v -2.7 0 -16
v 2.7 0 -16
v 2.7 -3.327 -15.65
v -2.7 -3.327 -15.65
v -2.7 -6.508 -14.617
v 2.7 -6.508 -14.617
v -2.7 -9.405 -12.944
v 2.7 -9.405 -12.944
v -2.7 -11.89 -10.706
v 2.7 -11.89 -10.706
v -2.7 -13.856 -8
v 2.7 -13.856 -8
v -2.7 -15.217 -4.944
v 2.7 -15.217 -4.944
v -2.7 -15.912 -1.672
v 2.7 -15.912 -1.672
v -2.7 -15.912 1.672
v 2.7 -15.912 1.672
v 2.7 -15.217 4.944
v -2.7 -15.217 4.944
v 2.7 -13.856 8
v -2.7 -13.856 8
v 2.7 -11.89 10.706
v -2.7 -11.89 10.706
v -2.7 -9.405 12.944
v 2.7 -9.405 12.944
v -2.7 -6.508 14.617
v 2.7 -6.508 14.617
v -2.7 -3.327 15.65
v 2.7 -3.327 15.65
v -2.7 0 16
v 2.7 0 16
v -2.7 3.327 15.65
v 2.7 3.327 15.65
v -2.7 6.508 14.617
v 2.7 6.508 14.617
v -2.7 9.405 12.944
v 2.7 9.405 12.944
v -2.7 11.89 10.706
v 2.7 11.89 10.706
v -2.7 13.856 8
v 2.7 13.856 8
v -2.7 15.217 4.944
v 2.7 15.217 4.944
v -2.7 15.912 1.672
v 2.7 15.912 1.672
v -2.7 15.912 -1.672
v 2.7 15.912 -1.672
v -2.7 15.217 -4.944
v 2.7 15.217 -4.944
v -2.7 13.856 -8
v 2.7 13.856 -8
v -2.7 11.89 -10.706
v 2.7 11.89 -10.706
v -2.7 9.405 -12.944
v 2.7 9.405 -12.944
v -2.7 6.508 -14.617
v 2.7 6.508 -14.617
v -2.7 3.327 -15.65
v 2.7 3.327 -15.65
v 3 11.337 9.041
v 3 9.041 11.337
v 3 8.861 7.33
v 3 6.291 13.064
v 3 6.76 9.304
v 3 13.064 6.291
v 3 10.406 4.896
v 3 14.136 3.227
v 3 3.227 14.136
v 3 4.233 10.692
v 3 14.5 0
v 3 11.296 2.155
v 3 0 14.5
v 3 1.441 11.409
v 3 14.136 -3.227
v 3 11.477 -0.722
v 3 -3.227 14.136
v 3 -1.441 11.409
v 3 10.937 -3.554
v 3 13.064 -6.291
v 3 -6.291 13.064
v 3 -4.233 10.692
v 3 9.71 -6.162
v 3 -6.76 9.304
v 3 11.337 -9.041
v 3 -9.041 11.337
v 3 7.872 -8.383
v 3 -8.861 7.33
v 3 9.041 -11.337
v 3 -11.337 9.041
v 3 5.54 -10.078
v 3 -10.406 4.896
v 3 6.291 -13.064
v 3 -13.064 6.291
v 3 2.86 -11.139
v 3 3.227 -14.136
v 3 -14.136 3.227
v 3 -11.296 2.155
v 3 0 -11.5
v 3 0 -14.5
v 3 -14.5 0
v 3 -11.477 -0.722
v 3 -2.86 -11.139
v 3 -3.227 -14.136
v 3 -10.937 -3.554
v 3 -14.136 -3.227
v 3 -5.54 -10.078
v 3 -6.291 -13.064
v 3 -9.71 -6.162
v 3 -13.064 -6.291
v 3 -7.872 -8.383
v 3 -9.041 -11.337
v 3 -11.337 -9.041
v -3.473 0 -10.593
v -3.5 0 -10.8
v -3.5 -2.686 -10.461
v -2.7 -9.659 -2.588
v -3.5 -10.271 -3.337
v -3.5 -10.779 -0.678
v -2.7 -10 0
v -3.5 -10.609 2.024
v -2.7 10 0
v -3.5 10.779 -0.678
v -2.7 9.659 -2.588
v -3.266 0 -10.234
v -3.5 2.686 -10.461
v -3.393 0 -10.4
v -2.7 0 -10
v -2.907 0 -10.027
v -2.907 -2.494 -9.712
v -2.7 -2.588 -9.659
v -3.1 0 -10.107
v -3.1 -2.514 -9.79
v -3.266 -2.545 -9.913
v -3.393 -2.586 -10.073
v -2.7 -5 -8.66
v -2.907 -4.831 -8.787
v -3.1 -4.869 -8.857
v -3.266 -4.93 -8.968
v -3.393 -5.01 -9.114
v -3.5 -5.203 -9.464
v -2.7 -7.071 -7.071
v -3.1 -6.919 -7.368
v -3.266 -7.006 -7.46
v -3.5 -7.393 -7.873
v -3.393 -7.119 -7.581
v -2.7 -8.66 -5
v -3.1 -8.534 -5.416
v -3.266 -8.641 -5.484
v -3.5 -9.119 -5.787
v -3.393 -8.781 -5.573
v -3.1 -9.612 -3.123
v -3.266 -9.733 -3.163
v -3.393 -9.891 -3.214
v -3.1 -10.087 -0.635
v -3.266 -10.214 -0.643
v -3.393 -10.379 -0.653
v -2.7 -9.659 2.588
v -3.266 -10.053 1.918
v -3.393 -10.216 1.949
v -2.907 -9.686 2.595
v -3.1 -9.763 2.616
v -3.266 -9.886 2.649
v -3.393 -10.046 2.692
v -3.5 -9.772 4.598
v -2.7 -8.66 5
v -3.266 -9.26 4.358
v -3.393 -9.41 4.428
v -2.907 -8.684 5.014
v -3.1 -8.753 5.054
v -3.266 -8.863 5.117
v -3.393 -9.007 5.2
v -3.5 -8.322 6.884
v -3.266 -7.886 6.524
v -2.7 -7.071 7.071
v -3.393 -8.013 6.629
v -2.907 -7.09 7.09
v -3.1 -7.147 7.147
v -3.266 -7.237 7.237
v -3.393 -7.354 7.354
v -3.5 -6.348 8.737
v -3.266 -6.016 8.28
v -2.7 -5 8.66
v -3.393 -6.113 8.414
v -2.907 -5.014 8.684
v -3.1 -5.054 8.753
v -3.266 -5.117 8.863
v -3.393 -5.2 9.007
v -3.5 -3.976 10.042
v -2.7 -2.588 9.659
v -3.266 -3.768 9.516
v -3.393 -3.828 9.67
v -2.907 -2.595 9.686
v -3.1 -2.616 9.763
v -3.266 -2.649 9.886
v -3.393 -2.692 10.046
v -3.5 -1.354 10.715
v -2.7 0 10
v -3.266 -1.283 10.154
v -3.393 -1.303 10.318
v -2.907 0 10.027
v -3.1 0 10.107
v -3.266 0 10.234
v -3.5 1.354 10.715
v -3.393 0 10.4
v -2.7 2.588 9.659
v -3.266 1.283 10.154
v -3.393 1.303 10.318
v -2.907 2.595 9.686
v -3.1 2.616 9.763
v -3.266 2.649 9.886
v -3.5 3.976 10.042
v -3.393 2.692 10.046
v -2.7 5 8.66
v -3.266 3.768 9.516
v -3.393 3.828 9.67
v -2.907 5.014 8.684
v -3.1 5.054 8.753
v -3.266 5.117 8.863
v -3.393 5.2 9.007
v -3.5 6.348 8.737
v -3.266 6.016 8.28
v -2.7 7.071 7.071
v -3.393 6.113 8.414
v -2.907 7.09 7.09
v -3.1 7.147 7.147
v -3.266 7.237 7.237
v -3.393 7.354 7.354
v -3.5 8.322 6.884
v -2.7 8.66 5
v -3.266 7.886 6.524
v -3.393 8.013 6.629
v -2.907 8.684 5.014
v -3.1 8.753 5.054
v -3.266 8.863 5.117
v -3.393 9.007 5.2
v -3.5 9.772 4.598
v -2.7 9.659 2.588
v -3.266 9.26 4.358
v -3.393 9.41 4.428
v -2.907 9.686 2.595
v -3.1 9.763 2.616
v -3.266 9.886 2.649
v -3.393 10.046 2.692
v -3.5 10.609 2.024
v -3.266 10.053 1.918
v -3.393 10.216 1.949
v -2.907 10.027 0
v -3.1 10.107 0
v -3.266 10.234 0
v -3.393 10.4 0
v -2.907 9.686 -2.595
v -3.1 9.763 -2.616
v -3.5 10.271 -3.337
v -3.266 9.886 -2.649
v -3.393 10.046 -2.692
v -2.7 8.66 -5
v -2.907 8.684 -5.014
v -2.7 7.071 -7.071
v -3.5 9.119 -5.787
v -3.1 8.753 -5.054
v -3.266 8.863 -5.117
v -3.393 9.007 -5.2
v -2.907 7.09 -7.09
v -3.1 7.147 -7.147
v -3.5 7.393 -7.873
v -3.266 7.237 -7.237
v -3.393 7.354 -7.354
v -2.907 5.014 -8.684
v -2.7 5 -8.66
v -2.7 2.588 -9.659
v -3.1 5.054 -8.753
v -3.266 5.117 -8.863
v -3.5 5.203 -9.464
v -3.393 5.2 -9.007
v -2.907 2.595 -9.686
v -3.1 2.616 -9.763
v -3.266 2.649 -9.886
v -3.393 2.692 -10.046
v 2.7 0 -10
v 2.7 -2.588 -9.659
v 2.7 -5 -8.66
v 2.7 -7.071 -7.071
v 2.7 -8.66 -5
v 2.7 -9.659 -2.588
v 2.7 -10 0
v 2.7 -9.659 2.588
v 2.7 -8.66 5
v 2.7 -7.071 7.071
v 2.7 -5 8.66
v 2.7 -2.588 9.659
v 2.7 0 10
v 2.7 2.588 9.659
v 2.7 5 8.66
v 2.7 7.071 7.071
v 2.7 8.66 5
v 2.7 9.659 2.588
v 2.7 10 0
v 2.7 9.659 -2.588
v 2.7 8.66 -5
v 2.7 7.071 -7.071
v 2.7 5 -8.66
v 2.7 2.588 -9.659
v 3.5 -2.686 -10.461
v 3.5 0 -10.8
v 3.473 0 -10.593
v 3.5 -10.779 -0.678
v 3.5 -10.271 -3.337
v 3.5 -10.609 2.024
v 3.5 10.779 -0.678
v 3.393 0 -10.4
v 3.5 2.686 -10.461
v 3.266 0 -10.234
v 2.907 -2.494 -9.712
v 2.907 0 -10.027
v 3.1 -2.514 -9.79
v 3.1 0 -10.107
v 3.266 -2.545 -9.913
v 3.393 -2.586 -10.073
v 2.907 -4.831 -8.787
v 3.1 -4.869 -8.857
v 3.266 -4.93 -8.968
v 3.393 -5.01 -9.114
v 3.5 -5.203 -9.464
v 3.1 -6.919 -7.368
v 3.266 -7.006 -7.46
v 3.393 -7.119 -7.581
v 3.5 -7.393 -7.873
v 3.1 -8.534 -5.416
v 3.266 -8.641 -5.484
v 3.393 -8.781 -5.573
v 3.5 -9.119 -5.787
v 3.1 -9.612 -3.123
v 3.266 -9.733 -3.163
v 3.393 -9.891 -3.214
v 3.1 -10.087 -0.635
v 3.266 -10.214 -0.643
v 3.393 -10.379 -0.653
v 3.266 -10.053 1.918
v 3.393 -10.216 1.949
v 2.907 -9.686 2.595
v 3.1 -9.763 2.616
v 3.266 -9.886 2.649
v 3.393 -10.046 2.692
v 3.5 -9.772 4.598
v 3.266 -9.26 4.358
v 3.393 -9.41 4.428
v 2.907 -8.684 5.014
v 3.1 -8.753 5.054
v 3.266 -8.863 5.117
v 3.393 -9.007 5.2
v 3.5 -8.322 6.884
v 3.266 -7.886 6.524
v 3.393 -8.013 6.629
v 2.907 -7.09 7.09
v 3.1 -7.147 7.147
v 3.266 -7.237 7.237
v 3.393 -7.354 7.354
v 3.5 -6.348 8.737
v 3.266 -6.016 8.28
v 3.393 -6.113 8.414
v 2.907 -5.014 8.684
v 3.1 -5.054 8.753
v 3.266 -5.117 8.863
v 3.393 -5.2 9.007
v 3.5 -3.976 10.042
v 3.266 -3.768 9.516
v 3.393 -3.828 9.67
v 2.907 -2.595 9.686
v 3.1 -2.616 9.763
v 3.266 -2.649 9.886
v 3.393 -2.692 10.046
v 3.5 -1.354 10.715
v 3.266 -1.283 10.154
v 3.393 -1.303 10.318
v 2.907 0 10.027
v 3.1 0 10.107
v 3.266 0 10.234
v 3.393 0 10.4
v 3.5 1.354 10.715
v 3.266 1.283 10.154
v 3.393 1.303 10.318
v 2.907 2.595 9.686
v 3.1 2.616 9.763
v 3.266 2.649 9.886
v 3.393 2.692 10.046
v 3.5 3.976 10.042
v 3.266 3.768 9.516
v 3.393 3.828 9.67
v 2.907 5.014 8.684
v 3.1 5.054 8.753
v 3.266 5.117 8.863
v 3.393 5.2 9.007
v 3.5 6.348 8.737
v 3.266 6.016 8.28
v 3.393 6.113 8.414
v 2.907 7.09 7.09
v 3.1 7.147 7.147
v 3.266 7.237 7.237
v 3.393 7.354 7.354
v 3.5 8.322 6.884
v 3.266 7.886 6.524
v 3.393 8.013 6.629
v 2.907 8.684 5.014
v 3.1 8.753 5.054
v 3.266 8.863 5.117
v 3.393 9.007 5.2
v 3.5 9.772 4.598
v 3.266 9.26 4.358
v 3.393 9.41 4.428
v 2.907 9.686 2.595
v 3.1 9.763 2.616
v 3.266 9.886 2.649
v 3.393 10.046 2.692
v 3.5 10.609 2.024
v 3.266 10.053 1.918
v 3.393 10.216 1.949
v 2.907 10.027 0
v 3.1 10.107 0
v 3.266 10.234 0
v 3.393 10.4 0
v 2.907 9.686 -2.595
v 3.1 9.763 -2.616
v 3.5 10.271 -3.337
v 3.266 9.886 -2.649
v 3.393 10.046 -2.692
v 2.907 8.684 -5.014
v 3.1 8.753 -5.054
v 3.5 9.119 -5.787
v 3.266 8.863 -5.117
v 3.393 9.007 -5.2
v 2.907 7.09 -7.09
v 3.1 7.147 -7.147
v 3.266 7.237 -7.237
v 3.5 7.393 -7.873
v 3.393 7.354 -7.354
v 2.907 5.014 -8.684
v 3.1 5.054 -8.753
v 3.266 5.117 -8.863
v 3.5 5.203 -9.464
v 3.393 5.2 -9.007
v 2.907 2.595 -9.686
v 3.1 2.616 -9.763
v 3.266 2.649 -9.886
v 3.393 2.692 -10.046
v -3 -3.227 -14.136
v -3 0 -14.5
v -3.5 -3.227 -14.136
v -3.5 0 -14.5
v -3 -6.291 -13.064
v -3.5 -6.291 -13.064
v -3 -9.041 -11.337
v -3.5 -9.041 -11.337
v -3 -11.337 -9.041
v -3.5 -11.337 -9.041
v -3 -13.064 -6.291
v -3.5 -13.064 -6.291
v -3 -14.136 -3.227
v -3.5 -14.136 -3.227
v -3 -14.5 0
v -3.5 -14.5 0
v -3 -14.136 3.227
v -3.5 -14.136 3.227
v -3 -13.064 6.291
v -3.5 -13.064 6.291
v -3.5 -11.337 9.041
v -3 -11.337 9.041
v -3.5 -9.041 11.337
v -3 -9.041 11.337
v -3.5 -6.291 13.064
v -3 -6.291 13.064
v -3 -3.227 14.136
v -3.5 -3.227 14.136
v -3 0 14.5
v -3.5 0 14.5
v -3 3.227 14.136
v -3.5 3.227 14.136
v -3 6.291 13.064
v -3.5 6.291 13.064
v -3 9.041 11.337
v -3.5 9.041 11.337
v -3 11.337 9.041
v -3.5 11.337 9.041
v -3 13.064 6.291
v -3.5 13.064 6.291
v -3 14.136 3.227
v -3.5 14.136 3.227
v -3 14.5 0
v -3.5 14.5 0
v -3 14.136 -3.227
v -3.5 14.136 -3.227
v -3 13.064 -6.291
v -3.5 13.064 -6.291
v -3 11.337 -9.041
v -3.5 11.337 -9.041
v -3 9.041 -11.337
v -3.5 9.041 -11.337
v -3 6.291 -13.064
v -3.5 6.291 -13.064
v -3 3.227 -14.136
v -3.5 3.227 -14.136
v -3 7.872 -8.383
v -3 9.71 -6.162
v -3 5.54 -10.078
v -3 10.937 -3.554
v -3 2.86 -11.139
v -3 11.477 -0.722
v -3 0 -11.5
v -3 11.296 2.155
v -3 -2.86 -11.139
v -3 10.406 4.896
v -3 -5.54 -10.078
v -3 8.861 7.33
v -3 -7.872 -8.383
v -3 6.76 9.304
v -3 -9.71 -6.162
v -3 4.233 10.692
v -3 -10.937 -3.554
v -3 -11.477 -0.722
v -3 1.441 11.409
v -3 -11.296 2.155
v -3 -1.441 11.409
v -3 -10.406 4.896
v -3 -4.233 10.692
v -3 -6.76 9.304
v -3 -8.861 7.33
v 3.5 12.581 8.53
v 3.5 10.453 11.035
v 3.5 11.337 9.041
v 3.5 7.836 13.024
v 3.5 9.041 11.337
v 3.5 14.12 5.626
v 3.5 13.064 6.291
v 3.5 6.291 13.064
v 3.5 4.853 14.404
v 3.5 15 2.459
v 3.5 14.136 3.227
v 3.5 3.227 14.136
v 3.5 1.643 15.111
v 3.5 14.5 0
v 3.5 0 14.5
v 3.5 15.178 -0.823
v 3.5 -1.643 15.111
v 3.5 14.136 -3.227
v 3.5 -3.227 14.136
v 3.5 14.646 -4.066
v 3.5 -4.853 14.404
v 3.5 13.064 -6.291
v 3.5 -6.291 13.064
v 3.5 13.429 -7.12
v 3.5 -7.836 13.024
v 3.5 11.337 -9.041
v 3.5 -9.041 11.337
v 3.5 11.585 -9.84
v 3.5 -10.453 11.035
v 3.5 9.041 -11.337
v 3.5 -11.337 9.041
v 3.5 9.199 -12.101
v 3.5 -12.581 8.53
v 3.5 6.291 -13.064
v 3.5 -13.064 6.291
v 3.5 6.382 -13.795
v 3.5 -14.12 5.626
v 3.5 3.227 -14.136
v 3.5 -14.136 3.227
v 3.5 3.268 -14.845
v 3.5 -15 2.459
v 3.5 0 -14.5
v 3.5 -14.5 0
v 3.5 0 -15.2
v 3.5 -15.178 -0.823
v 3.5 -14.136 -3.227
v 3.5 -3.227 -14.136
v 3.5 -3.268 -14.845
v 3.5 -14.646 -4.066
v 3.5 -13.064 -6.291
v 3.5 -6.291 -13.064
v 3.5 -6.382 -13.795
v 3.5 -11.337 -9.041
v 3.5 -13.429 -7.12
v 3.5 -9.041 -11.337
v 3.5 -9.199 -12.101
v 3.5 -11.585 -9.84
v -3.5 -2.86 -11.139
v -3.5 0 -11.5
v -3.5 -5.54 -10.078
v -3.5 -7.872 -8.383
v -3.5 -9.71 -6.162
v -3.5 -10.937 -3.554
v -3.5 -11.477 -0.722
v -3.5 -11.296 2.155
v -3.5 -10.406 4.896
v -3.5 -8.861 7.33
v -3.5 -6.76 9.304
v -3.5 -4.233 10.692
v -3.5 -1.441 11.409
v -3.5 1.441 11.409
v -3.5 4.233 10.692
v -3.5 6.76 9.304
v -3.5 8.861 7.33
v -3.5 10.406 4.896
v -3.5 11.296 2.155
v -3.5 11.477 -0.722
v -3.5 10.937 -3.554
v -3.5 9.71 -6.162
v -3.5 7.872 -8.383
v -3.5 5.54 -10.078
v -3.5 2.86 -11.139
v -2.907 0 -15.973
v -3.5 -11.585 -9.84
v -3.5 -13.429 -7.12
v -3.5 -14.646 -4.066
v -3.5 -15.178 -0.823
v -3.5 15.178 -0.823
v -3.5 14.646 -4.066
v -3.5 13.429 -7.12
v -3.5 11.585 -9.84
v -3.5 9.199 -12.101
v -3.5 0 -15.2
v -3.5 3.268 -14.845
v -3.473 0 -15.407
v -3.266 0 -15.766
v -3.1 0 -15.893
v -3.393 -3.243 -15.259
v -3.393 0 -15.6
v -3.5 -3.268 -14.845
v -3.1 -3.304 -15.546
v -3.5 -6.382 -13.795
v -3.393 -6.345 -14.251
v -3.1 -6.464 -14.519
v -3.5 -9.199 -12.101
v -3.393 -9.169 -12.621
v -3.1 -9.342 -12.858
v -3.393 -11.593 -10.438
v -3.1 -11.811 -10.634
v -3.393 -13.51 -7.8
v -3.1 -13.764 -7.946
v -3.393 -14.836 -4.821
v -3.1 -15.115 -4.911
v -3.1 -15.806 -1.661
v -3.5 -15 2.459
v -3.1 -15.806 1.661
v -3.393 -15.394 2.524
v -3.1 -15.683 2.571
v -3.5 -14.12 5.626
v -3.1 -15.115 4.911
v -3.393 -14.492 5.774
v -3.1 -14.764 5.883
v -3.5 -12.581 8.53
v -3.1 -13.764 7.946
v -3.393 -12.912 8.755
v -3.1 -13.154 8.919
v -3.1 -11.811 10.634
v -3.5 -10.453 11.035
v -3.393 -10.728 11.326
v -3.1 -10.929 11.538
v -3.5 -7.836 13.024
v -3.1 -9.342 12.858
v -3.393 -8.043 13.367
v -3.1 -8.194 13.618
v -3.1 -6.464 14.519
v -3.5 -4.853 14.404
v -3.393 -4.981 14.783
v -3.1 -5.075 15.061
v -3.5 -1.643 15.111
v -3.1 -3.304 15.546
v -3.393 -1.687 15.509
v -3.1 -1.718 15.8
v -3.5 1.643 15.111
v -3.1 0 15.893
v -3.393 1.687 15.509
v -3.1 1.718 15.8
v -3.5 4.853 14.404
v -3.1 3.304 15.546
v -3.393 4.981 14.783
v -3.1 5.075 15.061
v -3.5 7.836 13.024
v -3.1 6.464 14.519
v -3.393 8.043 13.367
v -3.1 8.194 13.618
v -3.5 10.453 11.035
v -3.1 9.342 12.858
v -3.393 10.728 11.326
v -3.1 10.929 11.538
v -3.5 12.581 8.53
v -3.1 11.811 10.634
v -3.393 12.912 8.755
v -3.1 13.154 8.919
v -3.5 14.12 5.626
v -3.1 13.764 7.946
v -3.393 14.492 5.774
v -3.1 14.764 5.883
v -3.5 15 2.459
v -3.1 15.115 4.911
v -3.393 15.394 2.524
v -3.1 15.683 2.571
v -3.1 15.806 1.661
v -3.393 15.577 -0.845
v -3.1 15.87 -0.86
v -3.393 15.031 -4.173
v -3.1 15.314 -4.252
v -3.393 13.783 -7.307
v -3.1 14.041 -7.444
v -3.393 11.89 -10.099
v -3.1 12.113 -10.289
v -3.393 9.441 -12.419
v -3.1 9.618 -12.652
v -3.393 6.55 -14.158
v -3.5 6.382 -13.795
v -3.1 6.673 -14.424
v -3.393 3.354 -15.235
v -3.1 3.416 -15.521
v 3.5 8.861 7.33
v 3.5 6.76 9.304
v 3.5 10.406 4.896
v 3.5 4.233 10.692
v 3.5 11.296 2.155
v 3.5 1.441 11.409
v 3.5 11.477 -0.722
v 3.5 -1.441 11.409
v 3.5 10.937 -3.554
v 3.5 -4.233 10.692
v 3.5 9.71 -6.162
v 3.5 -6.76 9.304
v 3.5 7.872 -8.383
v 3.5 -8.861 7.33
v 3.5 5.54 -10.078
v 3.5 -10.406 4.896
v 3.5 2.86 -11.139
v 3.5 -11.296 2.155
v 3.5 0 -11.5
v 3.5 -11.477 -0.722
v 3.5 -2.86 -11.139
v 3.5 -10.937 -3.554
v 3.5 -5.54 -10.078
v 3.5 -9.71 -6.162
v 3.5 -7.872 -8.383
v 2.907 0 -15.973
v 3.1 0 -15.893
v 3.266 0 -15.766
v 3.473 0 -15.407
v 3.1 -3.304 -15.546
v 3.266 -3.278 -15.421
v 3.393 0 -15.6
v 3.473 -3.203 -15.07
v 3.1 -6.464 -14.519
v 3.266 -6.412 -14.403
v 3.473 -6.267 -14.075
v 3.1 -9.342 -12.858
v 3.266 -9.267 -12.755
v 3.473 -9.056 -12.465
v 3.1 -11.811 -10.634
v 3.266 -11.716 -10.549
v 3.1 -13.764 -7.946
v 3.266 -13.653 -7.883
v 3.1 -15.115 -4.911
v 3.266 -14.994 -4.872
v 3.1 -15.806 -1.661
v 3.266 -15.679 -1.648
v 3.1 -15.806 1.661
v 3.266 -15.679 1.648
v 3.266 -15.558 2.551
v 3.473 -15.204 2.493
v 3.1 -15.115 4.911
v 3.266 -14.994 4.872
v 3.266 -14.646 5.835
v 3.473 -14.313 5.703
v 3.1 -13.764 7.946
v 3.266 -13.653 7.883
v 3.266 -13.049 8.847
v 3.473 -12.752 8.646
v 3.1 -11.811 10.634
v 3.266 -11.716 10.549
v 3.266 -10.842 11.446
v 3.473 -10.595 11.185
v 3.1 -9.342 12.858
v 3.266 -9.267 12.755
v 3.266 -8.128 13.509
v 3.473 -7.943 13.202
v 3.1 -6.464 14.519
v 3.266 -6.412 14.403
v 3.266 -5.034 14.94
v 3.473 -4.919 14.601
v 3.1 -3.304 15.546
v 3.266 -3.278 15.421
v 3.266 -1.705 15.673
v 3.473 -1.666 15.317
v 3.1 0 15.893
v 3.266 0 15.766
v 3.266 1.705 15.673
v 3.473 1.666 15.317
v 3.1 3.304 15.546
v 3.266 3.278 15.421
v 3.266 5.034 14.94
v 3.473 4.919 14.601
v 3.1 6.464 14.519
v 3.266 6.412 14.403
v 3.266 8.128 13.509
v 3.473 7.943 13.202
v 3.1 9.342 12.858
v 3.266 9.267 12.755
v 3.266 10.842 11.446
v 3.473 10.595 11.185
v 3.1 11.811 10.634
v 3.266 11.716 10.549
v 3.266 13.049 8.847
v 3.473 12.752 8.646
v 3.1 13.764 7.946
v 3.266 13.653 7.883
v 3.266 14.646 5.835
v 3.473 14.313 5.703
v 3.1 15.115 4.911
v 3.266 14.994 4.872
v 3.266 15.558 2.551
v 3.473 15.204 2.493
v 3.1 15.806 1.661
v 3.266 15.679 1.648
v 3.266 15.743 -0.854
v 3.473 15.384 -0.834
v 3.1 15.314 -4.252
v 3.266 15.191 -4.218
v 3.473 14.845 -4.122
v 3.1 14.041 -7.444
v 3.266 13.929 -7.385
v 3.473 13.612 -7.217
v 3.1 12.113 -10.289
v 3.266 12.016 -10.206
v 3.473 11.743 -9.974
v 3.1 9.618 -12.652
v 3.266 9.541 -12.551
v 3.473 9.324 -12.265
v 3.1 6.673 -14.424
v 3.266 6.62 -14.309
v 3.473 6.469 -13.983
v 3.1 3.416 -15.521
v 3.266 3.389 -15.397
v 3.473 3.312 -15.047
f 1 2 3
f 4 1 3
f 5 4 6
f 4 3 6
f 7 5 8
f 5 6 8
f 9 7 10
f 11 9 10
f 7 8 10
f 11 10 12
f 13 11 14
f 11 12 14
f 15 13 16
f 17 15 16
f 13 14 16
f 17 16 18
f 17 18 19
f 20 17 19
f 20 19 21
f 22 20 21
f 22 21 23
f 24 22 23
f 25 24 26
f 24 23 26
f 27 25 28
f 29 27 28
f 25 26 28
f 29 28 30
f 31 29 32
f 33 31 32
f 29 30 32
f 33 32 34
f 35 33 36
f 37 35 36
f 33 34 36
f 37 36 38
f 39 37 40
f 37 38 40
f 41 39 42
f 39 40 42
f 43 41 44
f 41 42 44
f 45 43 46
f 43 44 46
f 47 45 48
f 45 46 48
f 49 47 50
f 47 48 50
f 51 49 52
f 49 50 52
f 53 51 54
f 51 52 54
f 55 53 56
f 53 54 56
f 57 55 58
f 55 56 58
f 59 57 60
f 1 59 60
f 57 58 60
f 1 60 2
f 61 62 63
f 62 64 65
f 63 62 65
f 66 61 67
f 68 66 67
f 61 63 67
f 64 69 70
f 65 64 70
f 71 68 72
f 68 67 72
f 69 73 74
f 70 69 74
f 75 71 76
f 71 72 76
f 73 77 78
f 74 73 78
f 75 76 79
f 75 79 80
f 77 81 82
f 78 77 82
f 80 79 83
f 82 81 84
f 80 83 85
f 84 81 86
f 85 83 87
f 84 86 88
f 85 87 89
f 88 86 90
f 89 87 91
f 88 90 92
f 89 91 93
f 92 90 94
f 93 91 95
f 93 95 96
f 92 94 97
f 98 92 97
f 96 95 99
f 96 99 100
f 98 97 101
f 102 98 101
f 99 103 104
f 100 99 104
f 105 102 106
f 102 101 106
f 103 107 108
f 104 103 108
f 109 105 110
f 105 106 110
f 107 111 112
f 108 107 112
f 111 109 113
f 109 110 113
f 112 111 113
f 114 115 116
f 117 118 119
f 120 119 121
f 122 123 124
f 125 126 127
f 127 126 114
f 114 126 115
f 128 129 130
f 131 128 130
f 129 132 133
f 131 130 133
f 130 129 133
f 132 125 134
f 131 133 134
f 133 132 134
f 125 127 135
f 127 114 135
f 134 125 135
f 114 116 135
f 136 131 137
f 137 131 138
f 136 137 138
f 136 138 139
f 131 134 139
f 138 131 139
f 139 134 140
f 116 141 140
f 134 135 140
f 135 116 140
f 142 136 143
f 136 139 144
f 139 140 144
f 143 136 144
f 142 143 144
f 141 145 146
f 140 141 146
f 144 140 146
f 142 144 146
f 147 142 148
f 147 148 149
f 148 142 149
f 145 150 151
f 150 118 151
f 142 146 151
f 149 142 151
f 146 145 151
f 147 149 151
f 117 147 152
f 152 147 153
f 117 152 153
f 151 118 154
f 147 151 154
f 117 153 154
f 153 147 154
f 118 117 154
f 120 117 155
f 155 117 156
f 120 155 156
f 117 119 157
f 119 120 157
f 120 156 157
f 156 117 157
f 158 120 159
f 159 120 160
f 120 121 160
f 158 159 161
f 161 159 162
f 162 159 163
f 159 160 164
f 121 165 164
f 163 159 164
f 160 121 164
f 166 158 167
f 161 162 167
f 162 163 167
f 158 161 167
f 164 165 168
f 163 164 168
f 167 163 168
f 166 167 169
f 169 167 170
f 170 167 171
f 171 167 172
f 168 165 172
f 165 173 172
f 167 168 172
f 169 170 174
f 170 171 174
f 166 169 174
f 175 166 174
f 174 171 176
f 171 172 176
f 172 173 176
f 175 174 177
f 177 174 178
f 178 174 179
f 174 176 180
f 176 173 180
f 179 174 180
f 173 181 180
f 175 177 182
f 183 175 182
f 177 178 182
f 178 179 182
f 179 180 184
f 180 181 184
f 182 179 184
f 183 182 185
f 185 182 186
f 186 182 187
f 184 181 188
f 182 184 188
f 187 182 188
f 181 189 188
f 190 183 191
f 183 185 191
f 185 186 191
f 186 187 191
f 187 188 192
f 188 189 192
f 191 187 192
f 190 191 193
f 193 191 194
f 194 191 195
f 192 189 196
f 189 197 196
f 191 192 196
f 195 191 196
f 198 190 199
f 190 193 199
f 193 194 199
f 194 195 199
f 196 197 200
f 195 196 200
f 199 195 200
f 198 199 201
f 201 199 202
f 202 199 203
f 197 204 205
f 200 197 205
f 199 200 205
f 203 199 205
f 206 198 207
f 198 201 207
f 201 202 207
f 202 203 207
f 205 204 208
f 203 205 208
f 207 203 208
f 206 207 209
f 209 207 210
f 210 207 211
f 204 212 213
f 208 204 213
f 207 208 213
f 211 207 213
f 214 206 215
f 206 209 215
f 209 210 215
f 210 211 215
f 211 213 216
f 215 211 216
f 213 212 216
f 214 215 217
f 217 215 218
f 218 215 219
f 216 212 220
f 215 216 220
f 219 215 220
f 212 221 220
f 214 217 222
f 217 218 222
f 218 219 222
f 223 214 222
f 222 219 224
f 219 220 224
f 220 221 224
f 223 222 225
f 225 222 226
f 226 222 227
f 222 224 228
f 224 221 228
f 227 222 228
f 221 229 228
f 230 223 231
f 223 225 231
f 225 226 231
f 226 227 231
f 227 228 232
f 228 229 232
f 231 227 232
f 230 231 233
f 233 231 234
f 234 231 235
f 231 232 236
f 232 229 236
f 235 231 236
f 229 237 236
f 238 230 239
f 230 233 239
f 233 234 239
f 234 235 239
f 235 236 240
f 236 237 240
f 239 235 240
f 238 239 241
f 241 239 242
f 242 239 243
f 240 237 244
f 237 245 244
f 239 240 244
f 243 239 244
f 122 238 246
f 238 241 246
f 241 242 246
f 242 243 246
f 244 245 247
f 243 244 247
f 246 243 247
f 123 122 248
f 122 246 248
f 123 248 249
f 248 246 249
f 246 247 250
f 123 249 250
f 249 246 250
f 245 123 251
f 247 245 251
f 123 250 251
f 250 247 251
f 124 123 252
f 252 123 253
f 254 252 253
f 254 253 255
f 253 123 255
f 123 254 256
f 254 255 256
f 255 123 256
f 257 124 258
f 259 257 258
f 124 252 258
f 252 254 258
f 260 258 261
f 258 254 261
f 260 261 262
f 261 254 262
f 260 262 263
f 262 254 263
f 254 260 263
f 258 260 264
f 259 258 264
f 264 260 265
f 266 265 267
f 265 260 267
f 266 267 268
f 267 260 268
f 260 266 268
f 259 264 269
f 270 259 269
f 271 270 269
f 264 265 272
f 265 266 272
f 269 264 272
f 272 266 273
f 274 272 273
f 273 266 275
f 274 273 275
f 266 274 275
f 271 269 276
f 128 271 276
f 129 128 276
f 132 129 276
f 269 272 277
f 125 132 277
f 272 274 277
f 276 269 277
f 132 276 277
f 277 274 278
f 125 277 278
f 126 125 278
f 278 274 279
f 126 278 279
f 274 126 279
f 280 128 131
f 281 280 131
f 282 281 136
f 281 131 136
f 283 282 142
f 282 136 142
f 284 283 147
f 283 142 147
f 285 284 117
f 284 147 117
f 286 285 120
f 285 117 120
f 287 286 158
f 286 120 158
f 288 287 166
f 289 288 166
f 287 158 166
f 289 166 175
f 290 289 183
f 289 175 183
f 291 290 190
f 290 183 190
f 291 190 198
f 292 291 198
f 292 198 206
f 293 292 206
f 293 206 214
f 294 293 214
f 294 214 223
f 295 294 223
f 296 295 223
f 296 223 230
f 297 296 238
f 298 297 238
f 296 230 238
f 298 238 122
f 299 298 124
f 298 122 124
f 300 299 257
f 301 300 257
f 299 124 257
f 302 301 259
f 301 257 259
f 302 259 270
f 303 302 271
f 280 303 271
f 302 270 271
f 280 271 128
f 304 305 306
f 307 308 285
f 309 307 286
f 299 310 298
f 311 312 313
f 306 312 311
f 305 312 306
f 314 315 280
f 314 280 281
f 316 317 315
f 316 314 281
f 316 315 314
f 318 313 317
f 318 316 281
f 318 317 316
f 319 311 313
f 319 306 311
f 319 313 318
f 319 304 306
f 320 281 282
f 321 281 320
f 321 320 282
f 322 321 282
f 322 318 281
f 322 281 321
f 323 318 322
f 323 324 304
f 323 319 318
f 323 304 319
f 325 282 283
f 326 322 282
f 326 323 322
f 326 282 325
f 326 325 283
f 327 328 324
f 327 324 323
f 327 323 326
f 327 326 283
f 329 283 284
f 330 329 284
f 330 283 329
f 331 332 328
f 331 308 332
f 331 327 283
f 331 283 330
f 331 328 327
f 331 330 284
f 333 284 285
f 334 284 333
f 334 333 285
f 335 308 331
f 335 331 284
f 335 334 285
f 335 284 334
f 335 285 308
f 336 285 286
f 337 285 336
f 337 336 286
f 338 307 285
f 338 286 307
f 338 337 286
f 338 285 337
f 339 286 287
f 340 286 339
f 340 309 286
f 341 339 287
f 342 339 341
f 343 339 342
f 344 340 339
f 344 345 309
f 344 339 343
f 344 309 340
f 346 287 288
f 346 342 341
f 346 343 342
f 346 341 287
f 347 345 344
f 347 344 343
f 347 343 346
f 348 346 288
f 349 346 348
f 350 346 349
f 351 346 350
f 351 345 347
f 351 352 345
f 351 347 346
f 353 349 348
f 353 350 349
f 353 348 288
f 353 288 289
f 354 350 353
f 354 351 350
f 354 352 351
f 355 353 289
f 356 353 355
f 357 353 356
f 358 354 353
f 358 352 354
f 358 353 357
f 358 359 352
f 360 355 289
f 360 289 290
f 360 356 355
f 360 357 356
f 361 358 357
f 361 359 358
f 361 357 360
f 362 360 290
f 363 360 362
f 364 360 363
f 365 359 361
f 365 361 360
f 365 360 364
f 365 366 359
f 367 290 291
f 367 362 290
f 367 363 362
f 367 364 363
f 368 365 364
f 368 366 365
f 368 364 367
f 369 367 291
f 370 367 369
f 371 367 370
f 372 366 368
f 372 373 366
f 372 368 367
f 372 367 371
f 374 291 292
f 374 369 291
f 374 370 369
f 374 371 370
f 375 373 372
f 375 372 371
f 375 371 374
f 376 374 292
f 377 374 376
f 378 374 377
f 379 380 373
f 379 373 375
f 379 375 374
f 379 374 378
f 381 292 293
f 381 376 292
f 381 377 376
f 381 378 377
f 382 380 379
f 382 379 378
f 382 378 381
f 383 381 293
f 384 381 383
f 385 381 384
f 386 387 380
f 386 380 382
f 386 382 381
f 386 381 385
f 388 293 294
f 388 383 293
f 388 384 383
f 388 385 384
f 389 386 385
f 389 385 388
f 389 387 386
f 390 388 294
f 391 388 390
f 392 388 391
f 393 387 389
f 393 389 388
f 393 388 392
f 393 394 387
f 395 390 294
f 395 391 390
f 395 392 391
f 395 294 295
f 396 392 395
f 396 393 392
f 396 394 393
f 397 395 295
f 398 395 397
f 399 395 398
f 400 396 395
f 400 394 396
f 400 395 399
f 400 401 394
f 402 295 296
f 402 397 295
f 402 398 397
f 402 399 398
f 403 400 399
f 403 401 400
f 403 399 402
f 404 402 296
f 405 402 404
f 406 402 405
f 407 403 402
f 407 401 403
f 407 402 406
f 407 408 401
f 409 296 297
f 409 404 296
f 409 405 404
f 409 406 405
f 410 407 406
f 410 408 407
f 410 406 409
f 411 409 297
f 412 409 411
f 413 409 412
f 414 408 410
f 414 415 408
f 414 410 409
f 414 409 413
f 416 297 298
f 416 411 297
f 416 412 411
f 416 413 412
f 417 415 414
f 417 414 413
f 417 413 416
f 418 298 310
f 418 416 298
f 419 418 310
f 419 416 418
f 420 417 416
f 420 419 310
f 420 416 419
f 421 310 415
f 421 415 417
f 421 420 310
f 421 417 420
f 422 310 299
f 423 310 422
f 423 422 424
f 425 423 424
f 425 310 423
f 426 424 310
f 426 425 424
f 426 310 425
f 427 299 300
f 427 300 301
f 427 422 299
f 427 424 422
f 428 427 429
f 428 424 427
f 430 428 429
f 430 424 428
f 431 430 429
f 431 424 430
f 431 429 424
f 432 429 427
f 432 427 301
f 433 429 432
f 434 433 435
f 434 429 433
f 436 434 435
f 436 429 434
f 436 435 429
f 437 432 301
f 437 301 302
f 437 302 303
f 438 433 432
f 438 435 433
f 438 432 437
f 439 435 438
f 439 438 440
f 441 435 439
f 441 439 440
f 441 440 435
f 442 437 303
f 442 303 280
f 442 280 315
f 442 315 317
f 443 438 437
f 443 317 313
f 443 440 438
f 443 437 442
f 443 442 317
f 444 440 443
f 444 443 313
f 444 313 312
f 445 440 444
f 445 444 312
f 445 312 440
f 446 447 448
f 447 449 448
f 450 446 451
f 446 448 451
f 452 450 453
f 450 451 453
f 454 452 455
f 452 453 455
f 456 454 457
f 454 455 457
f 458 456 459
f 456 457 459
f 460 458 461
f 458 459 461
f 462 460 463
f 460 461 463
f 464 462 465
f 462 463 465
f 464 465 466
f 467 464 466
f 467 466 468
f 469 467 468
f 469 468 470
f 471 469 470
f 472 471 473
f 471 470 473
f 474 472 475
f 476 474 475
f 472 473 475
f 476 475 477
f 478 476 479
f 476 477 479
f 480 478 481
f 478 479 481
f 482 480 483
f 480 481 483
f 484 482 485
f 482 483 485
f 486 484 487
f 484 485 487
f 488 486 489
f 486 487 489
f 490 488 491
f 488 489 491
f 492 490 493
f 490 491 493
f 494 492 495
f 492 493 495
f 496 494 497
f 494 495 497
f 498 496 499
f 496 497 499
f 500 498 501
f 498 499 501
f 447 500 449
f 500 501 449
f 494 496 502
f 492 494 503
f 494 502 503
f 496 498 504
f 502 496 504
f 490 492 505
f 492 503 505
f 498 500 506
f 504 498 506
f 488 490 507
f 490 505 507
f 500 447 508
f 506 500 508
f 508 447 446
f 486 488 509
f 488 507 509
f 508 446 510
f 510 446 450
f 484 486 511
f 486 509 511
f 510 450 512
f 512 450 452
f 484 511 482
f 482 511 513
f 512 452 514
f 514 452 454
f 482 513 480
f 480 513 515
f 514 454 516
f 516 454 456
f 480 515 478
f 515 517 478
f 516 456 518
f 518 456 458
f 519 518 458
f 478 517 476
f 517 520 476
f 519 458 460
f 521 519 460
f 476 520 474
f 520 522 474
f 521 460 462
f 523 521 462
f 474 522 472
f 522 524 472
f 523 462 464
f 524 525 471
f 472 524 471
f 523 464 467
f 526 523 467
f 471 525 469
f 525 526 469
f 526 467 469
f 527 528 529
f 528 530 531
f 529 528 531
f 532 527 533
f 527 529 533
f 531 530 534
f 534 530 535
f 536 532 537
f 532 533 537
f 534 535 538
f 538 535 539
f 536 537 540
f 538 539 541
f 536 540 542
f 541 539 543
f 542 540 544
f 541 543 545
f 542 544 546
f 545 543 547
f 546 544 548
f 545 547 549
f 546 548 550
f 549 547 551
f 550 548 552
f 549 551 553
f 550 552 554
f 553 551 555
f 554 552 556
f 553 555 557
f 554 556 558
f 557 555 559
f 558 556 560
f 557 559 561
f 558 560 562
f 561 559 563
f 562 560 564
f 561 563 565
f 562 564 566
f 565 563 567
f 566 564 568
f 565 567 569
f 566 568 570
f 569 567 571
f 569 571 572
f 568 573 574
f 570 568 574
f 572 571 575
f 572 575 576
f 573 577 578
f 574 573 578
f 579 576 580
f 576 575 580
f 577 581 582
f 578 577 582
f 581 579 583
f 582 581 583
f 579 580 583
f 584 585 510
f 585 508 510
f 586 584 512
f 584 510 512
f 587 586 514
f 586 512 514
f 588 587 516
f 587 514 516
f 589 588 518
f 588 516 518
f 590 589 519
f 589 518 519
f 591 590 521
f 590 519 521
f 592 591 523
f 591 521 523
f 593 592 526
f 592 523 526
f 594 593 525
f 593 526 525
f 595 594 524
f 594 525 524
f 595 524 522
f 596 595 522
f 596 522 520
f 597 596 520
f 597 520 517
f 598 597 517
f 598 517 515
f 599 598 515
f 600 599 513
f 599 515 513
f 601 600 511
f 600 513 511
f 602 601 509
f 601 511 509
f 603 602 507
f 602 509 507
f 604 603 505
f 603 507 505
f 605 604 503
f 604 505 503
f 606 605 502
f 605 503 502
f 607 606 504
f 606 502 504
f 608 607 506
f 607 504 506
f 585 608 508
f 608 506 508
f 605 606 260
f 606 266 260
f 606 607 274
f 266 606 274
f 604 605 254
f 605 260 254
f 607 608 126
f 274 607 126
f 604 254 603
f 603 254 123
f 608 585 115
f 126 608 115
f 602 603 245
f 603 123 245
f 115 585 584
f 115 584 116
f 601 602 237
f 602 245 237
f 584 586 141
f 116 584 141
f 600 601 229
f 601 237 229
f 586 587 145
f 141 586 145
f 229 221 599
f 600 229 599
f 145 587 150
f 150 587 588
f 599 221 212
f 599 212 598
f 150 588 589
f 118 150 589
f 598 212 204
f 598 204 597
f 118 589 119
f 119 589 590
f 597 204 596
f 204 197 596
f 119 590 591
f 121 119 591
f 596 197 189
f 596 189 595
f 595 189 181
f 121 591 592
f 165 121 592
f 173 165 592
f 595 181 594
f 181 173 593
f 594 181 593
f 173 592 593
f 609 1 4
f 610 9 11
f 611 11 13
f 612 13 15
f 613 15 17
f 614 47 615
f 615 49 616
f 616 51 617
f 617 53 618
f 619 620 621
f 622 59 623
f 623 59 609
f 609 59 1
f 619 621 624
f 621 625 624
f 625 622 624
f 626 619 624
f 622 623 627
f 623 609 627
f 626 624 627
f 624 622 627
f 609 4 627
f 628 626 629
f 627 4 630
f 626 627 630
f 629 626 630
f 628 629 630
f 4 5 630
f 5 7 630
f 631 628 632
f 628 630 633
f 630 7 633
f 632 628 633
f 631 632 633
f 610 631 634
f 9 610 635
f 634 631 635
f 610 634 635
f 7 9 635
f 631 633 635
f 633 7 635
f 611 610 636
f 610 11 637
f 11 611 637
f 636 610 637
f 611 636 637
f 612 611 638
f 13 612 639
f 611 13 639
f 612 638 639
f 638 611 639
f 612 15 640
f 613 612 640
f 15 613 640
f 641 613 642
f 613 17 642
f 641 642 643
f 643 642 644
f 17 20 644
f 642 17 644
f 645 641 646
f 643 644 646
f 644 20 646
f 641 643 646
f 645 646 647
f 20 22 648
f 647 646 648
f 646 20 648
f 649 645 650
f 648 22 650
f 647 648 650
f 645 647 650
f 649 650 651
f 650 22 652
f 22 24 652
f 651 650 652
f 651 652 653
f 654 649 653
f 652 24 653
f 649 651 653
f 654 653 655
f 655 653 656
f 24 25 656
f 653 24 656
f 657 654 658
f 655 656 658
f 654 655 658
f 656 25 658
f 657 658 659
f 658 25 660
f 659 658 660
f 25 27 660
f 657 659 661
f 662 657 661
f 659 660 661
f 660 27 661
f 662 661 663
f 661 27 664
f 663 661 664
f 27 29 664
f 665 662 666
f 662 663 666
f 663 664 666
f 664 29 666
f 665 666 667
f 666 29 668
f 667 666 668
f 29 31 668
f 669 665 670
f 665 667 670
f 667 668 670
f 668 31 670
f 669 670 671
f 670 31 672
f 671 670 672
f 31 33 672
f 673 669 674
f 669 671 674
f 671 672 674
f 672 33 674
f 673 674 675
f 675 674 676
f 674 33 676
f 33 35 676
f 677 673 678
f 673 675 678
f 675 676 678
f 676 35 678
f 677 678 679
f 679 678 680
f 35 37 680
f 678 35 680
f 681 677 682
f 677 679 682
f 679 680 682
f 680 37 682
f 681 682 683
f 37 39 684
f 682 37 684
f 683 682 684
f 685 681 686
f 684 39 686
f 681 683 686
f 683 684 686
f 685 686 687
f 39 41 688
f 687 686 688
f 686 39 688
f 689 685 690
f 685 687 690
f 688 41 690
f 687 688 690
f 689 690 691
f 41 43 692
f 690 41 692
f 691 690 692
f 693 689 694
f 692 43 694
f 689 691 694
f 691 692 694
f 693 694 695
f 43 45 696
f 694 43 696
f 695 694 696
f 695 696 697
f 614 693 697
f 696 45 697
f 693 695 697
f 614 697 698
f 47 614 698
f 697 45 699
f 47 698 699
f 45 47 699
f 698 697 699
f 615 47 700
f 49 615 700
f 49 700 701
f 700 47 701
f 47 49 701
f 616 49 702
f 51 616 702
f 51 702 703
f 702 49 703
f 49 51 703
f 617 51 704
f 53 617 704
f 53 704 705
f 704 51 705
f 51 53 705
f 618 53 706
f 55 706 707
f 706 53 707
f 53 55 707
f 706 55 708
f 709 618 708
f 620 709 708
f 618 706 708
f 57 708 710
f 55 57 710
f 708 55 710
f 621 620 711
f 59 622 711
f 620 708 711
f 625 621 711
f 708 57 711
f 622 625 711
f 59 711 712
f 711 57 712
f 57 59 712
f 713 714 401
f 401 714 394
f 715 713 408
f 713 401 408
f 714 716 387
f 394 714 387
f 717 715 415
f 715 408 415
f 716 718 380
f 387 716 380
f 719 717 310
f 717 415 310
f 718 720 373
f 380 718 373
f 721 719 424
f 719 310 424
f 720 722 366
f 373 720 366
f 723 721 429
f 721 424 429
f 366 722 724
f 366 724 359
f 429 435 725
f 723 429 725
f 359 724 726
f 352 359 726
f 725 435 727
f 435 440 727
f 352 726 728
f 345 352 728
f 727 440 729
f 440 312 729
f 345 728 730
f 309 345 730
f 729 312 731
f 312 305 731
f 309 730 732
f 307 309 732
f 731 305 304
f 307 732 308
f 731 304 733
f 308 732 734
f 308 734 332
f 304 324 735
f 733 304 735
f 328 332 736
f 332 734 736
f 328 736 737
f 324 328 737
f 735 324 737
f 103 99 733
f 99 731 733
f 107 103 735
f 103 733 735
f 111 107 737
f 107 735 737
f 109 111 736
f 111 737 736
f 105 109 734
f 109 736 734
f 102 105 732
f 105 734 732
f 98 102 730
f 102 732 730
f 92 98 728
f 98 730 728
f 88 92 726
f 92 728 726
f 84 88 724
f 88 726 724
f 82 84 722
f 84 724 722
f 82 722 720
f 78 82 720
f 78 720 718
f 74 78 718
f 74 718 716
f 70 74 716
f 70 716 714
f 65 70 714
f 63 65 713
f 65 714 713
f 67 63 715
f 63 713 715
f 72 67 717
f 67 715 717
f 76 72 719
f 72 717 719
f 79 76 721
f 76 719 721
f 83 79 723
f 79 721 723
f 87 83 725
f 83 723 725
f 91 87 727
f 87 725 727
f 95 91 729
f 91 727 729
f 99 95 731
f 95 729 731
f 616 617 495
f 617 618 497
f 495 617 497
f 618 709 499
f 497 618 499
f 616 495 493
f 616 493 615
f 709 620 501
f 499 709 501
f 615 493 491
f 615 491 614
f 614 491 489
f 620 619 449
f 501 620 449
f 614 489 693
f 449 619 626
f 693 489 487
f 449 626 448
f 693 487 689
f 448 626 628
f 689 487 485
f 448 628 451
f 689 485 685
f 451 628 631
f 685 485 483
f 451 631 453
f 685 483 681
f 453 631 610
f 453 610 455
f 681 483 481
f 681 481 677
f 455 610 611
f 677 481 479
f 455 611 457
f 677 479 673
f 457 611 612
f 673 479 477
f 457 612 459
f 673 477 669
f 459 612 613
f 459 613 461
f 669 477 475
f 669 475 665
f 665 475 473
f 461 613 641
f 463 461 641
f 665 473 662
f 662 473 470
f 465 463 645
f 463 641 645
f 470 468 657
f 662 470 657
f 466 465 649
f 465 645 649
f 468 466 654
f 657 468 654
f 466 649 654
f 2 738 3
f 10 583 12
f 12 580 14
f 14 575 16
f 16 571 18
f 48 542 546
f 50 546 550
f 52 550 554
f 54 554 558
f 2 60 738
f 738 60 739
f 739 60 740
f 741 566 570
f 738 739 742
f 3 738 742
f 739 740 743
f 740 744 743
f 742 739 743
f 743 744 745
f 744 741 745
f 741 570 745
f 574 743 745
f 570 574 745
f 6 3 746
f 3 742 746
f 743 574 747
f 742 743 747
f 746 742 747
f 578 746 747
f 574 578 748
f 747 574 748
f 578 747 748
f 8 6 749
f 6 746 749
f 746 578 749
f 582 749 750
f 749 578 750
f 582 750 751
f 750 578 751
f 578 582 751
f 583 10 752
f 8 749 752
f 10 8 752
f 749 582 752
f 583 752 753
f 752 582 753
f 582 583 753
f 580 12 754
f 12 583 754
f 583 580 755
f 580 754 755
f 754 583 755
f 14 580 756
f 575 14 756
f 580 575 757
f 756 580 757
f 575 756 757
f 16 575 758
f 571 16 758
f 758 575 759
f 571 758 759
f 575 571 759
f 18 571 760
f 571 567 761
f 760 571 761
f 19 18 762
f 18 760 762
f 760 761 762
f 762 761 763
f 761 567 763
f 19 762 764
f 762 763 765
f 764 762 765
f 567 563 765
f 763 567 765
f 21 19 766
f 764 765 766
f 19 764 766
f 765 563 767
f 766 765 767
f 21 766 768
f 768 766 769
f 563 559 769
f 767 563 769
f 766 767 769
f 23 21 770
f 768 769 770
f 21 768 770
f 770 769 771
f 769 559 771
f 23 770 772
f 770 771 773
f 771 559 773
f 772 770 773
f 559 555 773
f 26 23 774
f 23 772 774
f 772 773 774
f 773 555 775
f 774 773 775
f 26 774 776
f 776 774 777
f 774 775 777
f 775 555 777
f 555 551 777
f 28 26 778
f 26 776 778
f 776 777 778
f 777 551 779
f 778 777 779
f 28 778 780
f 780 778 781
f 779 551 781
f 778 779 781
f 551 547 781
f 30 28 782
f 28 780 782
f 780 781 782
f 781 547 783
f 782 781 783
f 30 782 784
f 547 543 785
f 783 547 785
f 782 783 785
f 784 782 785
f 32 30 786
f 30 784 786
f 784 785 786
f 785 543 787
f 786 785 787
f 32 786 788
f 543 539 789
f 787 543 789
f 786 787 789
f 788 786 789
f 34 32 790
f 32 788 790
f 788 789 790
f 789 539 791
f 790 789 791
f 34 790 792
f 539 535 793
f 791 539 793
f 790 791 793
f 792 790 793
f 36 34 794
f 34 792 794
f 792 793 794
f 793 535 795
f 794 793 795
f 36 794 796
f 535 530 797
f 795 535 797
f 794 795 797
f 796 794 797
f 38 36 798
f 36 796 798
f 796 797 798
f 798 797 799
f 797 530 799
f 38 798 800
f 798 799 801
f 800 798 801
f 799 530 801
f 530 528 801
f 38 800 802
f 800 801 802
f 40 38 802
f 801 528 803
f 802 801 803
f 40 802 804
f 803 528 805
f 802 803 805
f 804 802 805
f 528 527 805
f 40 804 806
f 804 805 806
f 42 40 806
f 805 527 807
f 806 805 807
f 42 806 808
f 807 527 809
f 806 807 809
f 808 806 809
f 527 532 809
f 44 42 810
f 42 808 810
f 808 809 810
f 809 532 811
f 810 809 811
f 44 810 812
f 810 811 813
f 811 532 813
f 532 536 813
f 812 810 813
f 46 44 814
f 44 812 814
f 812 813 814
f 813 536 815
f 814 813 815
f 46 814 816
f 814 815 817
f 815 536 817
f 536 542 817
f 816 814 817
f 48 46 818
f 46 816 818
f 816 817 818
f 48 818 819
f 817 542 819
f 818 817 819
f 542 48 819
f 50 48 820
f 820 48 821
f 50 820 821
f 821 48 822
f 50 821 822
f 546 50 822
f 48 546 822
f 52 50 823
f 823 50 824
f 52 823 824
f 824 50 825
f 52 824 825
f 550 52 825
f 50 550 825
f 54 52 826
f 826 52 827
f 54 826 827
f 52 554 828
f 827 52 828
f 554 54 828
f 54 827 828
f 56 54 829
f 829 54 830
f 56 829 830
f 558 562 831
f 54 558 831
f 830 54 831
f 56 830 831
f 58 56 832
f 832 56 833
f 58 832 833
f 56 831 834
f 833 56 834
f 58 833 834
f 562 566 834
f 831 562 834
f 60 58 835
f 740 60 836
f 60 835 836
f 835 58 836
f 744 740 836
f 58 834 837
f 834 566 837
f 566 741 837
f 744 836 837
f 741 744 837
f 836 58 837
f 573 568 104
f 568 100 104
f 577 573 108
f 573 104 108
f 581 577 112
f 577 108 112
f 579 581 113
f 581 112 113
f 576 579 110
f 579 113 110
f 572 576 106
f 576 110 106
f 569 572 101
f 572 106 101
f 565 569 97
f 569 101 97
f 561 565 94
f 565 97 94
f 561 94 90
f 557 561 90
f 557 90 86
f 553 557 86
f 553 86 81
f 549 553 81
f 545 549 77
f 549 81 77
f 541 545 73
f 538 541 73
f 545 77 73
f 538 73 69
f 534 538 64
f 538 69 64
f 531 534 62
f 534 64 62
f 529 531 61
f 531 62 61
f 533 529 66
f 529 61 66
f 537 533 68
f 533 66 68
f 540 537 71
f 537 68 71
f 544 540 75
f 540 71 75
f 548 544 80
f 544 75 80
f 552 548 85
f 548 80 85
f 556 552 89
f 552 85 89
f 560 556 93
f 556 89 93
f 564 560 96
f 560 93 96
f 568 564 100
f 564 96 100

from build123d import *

# Parameters (mm, degrees)
FILLET_1_R = 0.8


with BuildPart() as part:
    # Эскиз1 → Повернуть1 (revolve)
    with BuildSketch(Plane.XY, mode=Mode.PRIVATE) as revolve_1_sk:
        Polygon((3.5, 10), (-3.5, 10), (-3.5, 11.5), (-3, 11.5), (-3, 14.5), (-3.5, 14.5), (-3.5, 16), (3.5, 16), (3.5, 14.5), (3, 14.5), (3, 11.5), (3.5, 11.5), align=None)
    revolve(revolve_1_sk.sketch.rotate(Axis((0, 0, 0), (-1, 0, 0)), 90), axis=Axis((0, 0, 0), (-1, 0, 0)))

    # Скругление1
    fillet_1_edges = [part.edges().sort_by_distance(p)[0] for p in [
        (-3.5, 0, 16),
        (3.5, 0, 16),
        (3.5, 0, 10),
        (-3.5, 0, 10),
    ]]
    fillet(fillet_1_edges, radius=FILLET_1_R)


solid = part.part
